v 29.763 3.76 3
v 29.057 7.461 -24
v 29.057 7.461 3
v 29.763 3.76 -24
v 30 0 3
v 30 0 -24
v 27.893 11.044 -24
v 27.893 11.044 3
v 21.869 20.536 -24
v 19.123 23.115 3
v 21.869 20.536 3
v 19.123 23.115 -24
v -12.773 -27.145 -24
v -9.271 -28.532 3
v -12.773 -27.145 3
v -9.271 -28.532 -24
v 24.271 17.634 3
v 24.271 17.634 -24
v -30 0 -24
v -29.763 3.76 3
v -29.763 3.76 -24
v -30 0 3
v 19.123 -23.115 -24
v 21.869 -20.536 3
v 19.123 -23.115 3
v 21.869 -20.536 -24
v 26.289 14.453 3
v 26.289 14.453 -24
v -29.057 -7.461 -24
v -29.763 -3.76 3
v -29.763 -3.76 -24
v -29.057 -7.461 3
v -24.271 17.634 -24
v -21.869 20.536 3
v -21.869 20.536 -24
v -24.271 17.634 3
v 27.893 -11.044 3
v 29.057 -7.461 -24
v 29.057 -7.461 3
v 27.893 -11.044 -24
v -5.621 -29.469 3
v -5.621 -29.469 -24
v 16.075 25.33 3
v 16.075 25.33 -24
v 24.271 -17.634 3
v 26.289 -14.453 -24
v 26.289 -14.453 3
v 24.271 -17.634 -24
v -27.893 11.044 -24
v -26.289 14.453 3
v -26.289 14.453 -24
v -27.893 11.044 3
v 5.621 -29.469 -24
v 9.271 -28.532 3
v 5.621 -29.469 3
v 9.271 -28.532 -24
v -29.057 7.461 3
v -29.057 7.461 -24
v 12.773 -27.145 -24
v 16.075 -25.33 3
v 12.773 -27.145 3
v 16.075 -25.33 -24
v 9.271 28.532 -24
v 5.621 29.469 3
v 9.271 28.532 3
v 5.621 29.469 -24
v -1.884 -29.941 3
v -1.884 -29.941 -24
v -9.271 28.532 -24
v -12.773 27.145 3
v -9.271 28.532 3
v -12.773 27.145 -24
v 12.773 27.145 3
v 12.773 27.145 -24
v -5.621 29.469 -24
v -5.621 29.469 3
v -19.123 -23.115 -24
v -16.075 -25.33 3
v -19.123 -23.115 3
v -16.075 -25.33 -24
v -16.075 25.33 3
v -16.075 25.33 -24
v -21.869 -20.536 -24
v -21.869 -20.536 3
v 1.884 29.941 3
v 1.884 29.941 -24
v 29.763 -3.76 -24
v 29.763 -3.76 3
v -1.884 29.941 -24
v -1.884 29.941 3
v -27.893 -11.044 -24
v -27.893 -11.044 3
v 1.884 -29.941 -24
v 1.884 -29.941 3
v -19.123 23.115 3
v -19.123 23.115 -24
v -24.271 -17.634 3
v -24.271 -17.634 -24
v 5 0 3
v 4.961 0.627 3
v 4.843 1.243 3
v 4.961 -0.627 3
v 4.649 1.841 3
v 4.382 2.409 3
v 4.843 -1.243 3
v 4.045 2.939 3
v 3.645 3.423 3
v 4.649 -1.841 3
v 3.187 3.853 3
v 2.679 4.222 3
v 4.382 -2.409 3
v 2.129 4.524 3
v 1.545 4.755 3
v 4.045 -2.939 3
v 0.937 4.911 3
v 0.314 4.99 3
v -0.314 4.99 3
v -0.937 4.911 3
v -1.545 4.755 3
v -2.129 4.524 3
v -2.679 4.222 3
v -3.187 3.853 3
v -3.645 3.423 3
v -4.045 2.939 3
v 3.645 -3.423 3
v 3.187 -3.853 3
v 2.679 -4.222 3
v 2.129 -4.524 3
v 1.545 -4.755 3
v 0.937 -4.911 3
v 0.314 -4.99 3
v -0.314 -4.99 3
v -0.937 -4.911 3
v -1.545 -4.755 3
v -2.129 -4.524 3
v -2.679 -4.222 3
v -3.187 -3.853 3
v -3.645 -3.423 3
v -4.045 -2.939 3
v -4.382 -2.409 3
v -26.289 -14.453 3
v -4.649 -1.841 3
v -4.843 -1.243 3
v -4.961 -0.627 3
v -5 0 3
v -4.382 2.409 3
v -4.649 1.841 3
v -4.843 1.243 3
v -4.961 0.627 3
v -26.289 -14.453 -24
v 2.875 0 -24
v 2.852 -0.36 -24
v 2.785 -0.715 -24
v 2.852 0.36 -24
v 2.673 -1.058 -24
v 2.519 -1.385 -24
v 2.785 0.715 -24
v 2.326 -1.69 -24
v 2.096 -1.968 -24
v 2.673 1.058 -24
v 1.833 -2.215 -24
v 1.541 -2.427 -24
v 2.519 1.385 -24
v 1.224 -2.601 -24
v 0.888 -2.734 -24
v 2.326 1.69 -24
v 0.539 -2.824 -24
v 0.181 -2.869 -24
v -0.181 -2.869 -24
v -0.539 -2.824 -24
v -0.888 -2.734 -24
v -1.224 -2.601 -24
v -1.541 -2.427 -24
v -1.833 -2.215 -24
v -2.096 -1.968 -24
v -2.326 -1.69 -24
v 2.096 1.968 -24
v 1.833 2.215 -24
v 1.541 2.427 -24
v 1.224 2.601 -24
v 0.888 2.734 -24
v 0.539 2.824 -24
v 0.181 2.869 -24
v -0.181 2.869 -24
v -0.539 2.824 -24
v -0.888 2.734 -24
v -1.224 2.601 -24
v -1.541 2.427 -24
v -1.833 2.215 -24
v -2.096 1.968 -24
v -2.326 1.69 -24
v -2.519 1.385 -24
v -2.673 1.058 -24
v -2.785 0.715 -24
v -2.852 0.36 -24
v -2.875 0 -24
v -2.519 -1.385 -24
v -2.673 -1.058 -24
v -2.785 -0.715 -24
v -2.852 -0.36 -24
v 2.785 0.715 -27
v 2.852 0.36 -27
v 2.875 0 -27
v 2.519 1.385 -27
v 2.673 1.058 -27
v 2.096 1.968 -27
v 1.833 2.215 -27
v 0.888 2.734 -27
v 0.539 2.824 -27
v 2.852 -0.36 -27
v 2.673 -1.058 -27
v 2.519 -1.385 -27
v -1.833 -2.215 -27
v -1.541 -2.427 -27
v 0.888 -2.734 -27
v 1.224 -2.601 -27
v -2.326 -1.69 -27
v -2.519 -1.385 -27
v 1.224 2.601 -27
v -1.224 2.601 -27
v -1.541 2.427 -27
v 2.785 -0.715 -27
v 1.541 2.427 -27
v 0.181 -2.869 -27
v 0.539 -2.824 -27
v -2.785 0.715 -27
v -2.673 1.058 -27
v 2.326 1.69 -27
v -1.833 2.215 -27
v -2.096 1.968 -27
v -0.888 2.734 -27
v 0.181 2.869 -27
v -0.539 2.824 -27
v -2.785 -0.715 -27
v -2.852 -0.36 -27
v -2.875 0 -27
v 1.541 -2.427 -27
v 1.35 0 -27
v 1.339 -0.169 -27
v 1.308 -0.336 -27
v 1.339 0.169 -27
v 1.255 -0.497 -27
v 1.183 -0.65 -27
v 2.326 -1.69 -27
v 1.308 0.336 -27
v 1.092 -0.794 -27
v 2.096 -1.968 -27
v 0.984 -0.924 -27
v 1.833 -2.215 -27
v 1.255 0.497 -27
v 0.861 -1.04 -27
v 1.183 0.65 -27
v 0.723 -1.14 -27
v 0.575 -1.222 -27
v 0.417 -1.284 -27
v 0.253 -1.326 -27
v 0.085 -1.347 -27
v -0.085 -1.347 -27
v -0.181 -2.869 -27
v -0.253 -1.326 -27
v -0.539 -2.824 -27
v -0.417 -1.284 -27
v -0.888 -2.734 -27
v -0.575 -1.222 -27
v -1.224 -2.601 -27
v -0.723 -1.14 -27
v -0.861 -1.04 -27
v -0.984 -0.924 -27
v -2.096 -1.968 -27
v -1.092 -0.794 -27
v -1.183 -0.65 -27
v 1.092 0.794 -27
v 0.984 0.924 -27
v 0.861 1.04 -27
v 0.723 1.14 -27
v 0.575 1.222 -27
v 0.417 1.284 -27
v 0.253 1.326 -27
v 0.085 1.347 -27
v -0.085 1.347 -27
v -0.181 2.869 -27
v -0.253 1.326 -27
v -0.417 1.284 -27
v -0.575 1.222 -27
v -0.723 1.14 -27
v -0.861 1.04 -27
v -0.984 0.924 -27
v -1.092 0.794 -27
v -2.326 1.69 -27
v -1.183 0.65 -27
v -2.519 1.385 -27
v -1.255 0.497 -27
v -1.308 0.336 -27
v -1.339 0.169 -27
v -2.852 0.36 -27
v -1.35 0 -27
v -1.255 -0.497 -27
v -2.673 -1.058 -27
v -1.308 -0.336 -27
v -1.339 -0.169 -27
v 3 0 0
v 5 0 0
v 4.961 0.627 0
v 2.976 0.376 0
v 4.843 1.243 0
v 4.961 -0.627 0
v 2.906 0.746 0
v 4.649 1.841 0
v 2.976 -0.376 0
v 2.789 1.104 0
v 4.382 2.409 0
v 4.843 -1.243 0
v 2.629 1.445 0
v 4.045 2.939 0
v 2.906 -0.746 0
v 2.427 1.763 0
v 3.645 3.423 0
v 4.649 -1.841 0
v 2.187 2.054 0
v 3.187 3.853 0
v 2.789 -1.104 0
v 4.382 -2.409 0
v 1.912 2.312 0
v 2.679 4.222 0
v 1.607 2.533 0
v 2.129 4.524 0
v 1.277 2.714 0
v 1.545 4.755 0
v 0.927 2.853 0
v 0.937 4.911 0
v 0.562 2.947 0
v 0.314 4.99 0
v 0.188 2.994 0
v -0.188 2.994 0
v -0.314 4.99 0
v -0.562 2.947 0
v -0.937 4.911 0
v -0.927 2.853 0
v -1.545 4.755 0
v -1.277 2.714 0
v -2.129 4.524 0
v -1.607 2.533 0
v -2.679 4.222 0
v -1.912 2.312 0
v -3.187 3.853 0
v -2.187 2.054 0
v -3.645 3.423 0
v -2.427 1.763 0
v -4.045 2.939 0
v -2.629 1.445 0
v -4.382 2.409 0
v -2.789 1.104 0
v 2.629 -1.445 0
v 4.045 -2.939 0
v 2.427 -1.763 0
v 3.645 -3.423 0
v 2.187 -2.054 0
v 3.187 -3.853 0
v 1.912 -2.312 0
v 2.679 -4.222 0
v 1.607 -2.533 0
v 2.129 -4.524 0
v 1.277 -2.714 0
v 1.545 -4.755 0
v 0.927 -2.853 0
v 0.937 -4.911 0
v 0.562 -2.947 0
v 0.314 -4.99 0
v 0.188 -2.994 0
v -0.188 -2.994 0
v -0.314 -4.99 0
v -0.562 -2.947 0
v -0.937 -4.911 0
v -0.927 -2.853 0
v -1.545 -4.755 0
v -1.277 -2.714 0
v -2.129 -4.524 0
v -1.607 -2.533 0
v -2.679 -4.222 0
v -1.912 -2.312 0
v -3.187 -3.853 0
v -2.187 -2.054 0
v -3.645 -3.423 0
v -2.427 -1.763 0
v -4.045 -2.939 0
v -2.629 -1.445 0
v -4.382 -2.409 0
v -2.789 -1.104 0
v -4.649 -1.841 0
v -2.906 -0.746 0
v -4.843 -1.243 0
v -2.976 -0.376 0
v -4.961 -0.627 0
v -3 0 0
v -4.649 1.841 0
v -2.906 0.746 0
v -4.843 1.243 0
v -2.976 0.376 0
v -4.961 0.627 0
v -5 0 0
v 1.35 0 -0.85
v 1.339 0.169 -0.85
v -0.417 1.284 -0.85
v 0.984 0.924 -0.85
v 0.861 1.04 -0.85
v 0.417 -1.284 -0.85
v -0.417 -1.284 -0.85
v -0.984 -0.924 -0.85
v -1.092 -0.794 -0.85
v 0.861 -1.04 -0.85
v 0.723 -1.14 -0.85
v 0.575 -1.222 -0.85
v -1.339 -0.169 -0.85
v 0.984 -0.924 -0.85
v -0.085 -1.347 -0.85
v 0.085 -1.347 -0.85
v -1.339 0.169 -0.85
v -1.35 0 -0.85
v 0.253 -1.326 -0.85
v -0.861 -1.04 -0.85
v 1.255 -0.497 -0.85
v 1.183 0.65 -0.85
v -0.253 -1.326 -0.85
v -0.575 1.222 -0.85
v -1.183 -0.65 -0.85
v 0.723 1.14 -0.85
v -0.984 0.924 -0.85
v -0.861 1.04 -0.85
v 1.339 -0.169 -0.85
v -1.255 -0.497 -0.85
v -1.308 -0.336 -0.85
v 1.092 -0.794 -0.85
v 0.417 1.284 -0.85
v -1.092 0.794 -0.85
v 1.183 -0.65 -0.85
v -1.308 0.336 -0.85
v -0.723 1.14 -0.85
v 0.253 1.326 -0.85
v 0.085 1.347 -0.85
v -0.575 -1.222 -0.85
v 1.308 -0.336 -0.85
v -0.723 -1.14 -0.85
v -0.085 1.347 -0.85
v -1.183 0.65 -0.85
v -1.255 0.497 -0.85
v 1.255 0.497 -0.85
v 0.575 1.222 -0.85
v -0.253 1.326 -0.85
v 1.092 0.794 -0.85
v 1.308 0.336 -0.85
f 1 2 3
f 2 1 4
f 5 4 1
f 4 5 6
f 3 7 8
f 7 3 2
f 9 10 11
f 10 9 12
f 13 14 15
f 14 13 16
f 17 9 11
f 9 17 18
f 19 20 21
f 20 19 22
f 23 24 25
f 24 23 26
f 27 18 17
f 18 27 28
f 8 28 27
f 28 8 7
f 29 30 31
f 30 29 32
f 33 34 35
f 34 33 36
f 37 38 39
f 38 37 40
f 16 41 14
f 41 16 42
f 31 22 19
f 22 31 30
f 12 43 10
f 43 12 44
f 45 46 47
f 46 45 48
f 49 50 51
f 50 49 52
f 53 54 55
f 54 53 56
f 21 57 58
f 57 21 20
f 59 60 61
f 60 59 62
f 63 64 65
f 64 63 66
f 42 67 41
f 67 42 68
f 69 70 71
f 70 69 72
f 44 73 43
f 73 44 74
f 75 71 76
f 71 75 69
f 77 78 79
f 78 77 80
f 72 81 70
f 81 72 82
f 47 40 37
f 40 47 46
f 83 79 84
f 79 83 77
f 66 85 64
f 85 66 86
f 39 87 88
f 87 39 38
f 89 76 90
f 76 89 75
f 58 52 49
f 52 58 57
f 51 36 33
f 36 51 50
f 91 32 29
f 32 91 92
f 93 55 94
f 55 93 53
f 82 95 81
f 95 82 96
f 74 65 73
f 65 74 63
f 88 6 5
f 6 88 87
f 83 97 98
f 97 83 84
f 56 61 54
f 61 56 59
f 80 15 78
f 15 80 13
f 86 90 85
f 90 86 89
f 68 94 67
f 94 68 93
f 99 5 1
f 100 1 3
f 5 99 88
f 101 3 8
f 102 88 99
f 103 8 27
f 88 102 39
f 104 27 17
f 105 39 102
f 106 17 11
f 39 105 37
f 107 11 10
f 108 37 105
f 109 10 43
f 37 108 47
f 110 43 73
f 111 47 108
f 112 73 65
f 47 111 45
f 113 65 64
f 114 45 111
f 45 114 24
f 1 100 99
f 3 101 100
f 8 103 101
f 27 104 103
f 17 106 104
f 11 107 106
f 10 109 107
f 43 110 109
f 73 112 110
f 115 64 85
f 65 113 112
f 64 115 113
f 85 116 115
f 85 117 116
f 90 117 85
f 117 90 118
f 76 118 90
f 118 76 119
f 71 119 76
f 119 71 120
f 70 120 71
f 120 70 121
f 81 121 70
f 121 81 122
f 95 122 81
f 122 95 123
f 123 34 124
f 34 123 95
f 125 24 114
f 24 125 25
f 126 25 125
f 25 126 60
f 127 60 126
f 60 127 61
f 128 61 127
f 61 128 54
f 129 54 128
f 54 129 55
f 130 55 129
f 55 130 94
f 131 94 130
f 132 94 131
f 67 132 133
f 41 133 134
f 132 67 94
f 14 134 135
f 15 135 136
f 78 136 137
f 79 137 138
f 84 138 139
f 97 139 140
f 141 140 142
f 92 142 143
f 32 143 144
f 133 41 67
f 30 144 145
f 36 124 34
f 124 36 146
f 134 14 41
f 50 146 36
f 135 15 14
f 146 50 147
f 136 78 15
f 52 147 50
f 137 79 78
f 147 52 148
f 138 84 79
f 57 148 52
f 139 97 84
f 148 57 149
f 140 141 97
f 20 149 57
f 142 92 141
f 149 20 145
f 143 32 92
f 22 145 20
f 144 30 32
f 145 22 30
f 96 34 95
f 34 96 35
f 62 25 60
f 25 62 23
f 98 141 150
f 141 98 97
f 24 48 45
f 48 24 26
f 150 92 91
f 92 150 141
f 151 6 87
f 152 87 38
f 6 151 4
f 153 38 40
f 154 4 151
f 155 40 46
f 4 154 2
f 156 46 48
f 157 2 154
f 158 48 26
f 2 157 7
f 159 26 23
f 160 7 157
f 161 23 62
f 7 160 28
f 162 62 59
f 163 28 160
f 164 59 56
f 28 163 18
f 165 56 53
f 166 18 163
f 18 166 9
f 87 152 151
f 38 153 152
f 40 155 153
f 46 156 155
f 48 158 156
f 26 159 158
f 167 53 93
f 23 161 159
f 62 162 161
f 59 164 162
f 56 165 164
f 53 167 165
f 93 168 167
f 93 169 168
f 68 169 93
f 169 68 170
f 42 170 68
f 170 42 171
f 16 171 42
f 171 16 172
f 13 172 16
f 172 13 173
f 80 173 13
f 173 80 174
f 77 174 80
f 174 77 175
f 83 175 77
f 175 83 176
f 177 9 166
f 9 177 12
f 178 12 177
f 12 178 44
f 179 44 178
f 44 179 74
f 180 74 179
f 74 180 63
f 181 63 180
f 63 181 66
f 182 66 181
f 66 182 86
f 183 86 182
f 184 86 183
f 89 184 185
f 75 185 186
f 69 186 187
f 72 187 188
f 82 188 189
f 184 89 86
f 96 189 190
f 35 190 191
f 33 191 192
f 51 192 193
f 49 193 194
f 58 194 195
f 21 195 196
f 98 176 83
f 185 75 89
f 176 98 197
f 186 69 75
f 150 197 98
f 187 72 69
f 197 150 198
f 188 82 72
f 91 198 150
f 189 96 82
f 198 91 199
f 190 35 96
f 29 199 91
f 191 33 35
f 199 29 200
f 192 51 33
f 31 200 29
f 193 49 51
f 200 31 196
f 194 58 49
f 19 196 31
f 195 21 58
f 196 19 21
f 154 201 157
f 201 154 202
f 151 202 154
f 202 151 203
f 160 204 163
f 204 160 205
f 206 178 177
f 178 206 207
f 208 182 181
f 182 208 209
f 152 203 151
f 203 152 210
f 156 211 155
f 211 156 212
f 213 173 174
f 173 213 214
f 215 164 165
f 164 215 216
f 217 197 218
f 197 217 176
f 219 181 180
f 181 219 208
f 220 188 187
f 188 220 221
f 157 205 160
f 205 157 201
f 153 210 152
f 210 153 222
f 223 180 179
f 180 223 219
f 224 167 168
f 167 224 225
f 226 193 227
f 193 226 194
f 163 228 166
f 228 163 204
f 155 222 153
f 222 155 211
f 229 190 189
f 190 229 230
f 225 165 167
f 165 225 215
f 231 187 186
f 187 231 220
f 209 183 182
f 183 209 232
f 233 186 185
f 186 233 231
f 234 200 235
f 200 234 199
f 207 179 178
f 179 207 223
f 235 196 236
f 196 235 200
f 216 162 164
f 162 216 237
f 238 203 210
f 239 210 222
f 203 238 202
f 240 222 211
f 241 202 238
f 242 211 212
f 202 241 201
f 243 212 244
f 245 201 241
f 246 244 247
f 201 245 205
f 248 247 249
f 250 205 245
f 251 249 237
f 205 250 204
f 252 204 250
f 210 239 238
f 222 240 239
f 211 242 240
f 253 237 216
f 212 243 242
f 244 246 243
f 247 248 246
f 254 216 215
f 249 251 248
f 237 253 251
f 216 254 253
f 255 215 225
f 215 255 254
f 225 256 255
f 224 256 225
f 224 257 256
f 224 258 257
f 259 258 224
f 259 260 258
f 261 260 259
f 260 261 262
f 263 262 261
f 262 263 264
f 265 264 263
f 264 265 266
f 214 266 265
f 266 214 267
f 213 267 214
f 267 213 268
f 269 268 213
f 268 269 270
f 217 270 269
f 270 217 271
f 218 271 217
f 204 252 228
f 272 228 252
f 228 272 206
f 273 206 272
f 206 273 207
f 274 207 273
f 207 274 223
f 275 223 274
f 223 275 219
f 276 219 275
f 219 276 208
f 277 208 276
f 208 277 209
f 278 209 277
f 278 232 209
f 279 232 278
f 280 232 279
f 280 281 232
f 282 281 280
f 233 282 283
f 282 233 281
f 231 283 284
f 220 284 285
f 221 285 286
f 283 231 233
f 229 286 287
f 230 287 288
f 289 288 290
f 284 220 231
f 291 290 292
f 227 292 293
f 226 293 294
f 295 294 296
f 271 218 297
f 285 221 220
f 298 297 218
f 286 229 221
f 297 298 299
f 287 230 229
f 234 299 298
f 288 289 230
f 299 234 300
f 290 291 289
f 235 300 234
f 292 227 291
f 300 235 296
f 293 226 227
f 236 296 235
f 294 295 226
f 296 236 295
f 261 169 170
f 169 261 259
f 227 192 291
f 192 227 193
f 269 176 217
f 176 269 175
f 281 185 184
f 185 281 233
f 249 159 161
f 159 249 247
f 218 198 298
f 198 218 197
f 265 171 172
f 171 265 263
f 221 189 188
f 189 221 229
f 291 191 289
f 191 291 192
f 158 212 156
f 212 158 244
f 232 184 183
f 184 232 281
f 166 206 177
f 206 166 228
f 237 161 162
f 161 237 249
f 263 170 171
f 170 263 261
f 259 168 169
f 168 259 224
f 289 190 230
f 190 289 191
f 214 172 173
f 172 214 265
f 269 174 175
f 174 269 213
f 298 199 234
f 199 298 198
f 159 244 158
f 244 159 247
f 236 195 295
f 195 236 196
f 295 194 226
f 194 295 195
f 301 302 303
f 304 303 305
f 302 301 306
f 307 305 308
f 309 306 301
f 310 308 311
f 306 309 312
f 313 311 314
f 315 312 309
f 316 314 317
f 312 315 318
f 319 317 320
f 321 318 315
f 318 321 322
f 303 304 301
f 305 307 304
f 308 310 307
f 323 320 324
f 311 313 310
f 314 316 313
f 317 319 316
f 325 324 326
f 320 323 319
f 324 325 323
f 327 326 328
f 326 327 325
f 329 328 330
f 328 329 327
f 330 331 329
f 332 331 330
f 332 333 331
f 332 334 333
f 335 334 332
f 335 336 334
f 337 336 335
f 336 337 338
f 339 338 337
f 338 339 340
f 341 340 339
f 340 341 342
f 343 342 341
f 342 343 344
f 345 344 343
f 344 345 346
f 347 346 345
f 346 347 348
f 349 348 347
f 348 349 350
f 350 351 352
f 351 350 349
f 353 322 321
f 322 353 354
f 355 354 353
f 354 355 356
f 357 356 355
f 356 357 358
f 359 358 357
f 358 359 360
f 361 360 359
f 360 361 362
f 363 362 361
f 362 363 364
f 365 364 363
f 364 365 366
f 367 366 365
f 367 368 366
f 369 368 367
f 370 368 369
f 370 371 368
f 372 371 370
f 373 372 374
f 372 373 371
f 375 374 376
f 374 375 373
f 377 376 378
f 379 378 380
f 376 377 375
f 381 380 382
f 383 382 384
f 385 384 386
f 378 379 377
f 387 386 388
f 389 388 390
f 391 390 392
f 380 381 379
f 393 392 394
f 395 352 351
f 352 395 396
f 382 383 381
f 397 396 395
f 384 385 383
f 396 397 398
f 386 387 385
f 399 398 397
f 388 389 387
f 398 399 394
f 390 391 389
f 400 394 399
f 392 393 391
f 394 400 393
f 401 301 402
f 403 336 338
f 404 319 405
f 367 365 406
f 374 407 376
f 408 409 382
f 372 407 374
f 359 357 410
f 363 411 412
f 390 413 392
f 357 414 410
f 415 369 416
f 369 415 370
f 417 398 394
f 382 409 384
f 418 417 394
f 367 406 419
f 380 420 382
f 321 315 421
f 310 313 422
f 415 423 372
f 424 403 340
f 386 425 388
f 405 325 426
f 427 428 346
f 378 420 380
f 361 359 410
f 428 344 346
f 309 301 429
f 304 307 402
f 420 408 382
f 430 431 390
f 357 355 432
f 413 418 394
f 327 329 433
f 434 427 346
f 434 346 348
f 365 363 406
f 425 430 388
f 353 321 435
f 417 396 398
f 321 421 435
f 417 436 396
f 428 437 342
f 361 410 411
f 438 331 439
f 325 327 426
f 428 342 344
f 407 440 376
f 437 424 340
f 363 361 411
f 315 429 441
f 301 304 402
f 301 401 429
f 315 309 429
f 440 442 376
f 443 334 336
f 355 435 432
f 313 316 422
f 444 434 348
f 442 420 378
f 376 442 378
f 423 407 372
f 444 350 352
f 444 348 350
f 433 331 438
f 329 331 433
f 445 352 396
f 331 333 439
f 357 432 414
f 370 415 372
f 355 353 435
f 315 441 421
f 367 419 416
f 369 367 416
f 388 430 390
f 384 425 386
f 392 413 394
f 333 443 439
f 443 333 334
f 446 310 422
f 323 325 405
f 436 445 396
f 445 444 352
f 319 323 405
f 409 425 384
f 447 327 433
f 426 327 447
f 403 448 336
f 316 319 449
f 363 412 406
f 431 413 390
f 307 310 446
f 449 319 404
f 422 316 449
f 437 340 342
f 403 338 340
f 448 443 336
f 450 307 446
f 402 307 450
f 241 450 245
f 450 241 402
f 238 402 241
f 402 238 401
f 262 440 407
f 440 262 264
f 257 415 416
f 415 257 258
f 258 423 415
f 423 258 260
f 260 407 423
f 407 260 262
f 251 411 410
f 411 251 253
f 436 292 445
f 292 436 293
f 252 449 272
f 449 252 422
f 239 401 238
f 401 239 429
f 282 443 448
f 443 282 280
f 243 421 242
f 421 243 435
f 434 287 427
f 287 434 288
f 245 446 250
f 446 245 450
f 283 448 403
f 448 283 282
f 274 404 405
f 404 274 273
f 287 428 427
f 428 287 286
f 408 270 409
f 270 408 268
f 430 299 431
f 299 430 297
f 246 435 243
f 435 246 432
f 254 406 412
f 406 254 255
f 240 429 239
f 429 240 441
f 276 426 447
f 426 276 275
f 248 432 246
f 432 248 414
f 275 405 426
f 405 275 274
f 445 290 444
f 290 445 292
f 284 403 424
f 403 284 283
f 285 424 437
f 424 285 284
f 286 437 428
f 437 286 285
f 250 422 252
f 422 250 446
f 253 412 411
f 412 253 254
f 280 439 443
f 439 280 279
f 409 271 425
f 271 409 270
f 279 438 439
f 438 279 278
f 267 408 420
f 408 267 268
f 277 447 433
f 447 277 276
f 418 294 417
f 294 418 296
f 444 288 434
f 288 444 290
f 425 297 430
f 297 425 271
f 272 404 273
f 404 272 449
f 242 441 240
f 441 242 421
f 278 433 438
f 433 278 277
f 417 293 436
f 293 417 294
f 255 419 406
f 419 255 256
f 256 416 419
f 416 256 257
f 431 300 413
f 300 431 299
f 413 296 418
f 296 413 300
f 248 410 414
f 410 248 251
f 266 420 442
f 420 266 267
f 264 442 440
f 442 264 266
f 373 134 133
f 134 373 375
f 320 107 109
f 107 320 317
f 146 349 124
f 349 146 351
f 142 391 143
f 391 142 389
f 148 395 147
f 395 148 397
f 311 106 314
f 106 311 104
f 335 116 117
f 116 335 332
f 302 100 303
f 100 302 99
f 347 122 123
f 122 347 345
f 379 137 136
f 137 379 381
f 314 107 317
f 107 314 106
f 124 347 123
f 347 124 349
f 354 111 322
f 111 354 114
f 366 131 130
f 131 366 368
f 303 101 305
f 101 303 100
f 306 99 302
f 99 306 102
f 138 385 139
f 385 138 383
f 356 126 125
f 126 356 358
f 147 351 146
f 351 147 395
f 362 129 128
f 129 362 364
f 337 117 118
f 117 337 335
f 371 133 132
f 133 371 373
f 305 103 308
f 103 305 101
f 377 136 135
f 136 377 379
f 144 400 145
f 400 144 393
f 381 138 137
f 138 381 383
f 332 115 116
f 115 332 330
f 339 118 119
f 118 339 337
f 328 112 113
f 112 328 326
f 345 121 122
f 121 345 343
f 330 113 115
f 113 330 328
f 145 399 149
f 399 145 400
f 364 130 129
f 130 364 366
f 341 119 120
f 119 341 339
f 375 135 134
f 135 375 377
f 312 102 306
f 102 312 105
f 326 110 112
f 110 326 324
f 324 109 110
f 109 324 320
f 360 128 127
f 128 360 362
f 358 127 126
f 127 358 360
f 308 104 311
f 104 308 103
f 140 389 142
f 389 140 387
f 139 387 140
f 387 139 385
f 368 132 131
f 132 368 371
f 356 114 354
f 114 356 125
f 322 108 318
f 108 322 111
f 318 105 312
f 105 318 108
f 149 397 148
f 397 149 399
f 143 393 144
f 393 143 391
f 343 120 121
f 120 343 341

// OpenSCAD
$fn = 50;

difference() {
	union() {
		translate(v = [0, 0, -24.0]) {
			cylinder(h = 27, r = 30.0);
		}
		#translate(v = [0, 0, -27.0]) {
			cylinder(h = 27, r = 2.875);
		}
	}
	union() {
		translate(v = [0, 0, 0]) {
			rotate(a = [0, 0, 0]) {
				difference() {
					union() {
						translate(v = [0, 0, -27.0]) {
							cylinder(h = 27, r = 1.0);
						}
						translate(v = [0, 0, -0.85]) {
							cylinder(h = 0.85, r1 = 1.35, r2 = 3.0);
						}
						translate(v = [0, 0, -27.0]) {
							cylinder(h = 27, r = 1.35);
						}
						translate(v = [0, 0, -27.0]) {
							cylinder(h = 27, r = 1.0);
						}
					}
					union();
				}
			}
		}
		#cylinder(h = 3, r = 5.0);
	}
}
